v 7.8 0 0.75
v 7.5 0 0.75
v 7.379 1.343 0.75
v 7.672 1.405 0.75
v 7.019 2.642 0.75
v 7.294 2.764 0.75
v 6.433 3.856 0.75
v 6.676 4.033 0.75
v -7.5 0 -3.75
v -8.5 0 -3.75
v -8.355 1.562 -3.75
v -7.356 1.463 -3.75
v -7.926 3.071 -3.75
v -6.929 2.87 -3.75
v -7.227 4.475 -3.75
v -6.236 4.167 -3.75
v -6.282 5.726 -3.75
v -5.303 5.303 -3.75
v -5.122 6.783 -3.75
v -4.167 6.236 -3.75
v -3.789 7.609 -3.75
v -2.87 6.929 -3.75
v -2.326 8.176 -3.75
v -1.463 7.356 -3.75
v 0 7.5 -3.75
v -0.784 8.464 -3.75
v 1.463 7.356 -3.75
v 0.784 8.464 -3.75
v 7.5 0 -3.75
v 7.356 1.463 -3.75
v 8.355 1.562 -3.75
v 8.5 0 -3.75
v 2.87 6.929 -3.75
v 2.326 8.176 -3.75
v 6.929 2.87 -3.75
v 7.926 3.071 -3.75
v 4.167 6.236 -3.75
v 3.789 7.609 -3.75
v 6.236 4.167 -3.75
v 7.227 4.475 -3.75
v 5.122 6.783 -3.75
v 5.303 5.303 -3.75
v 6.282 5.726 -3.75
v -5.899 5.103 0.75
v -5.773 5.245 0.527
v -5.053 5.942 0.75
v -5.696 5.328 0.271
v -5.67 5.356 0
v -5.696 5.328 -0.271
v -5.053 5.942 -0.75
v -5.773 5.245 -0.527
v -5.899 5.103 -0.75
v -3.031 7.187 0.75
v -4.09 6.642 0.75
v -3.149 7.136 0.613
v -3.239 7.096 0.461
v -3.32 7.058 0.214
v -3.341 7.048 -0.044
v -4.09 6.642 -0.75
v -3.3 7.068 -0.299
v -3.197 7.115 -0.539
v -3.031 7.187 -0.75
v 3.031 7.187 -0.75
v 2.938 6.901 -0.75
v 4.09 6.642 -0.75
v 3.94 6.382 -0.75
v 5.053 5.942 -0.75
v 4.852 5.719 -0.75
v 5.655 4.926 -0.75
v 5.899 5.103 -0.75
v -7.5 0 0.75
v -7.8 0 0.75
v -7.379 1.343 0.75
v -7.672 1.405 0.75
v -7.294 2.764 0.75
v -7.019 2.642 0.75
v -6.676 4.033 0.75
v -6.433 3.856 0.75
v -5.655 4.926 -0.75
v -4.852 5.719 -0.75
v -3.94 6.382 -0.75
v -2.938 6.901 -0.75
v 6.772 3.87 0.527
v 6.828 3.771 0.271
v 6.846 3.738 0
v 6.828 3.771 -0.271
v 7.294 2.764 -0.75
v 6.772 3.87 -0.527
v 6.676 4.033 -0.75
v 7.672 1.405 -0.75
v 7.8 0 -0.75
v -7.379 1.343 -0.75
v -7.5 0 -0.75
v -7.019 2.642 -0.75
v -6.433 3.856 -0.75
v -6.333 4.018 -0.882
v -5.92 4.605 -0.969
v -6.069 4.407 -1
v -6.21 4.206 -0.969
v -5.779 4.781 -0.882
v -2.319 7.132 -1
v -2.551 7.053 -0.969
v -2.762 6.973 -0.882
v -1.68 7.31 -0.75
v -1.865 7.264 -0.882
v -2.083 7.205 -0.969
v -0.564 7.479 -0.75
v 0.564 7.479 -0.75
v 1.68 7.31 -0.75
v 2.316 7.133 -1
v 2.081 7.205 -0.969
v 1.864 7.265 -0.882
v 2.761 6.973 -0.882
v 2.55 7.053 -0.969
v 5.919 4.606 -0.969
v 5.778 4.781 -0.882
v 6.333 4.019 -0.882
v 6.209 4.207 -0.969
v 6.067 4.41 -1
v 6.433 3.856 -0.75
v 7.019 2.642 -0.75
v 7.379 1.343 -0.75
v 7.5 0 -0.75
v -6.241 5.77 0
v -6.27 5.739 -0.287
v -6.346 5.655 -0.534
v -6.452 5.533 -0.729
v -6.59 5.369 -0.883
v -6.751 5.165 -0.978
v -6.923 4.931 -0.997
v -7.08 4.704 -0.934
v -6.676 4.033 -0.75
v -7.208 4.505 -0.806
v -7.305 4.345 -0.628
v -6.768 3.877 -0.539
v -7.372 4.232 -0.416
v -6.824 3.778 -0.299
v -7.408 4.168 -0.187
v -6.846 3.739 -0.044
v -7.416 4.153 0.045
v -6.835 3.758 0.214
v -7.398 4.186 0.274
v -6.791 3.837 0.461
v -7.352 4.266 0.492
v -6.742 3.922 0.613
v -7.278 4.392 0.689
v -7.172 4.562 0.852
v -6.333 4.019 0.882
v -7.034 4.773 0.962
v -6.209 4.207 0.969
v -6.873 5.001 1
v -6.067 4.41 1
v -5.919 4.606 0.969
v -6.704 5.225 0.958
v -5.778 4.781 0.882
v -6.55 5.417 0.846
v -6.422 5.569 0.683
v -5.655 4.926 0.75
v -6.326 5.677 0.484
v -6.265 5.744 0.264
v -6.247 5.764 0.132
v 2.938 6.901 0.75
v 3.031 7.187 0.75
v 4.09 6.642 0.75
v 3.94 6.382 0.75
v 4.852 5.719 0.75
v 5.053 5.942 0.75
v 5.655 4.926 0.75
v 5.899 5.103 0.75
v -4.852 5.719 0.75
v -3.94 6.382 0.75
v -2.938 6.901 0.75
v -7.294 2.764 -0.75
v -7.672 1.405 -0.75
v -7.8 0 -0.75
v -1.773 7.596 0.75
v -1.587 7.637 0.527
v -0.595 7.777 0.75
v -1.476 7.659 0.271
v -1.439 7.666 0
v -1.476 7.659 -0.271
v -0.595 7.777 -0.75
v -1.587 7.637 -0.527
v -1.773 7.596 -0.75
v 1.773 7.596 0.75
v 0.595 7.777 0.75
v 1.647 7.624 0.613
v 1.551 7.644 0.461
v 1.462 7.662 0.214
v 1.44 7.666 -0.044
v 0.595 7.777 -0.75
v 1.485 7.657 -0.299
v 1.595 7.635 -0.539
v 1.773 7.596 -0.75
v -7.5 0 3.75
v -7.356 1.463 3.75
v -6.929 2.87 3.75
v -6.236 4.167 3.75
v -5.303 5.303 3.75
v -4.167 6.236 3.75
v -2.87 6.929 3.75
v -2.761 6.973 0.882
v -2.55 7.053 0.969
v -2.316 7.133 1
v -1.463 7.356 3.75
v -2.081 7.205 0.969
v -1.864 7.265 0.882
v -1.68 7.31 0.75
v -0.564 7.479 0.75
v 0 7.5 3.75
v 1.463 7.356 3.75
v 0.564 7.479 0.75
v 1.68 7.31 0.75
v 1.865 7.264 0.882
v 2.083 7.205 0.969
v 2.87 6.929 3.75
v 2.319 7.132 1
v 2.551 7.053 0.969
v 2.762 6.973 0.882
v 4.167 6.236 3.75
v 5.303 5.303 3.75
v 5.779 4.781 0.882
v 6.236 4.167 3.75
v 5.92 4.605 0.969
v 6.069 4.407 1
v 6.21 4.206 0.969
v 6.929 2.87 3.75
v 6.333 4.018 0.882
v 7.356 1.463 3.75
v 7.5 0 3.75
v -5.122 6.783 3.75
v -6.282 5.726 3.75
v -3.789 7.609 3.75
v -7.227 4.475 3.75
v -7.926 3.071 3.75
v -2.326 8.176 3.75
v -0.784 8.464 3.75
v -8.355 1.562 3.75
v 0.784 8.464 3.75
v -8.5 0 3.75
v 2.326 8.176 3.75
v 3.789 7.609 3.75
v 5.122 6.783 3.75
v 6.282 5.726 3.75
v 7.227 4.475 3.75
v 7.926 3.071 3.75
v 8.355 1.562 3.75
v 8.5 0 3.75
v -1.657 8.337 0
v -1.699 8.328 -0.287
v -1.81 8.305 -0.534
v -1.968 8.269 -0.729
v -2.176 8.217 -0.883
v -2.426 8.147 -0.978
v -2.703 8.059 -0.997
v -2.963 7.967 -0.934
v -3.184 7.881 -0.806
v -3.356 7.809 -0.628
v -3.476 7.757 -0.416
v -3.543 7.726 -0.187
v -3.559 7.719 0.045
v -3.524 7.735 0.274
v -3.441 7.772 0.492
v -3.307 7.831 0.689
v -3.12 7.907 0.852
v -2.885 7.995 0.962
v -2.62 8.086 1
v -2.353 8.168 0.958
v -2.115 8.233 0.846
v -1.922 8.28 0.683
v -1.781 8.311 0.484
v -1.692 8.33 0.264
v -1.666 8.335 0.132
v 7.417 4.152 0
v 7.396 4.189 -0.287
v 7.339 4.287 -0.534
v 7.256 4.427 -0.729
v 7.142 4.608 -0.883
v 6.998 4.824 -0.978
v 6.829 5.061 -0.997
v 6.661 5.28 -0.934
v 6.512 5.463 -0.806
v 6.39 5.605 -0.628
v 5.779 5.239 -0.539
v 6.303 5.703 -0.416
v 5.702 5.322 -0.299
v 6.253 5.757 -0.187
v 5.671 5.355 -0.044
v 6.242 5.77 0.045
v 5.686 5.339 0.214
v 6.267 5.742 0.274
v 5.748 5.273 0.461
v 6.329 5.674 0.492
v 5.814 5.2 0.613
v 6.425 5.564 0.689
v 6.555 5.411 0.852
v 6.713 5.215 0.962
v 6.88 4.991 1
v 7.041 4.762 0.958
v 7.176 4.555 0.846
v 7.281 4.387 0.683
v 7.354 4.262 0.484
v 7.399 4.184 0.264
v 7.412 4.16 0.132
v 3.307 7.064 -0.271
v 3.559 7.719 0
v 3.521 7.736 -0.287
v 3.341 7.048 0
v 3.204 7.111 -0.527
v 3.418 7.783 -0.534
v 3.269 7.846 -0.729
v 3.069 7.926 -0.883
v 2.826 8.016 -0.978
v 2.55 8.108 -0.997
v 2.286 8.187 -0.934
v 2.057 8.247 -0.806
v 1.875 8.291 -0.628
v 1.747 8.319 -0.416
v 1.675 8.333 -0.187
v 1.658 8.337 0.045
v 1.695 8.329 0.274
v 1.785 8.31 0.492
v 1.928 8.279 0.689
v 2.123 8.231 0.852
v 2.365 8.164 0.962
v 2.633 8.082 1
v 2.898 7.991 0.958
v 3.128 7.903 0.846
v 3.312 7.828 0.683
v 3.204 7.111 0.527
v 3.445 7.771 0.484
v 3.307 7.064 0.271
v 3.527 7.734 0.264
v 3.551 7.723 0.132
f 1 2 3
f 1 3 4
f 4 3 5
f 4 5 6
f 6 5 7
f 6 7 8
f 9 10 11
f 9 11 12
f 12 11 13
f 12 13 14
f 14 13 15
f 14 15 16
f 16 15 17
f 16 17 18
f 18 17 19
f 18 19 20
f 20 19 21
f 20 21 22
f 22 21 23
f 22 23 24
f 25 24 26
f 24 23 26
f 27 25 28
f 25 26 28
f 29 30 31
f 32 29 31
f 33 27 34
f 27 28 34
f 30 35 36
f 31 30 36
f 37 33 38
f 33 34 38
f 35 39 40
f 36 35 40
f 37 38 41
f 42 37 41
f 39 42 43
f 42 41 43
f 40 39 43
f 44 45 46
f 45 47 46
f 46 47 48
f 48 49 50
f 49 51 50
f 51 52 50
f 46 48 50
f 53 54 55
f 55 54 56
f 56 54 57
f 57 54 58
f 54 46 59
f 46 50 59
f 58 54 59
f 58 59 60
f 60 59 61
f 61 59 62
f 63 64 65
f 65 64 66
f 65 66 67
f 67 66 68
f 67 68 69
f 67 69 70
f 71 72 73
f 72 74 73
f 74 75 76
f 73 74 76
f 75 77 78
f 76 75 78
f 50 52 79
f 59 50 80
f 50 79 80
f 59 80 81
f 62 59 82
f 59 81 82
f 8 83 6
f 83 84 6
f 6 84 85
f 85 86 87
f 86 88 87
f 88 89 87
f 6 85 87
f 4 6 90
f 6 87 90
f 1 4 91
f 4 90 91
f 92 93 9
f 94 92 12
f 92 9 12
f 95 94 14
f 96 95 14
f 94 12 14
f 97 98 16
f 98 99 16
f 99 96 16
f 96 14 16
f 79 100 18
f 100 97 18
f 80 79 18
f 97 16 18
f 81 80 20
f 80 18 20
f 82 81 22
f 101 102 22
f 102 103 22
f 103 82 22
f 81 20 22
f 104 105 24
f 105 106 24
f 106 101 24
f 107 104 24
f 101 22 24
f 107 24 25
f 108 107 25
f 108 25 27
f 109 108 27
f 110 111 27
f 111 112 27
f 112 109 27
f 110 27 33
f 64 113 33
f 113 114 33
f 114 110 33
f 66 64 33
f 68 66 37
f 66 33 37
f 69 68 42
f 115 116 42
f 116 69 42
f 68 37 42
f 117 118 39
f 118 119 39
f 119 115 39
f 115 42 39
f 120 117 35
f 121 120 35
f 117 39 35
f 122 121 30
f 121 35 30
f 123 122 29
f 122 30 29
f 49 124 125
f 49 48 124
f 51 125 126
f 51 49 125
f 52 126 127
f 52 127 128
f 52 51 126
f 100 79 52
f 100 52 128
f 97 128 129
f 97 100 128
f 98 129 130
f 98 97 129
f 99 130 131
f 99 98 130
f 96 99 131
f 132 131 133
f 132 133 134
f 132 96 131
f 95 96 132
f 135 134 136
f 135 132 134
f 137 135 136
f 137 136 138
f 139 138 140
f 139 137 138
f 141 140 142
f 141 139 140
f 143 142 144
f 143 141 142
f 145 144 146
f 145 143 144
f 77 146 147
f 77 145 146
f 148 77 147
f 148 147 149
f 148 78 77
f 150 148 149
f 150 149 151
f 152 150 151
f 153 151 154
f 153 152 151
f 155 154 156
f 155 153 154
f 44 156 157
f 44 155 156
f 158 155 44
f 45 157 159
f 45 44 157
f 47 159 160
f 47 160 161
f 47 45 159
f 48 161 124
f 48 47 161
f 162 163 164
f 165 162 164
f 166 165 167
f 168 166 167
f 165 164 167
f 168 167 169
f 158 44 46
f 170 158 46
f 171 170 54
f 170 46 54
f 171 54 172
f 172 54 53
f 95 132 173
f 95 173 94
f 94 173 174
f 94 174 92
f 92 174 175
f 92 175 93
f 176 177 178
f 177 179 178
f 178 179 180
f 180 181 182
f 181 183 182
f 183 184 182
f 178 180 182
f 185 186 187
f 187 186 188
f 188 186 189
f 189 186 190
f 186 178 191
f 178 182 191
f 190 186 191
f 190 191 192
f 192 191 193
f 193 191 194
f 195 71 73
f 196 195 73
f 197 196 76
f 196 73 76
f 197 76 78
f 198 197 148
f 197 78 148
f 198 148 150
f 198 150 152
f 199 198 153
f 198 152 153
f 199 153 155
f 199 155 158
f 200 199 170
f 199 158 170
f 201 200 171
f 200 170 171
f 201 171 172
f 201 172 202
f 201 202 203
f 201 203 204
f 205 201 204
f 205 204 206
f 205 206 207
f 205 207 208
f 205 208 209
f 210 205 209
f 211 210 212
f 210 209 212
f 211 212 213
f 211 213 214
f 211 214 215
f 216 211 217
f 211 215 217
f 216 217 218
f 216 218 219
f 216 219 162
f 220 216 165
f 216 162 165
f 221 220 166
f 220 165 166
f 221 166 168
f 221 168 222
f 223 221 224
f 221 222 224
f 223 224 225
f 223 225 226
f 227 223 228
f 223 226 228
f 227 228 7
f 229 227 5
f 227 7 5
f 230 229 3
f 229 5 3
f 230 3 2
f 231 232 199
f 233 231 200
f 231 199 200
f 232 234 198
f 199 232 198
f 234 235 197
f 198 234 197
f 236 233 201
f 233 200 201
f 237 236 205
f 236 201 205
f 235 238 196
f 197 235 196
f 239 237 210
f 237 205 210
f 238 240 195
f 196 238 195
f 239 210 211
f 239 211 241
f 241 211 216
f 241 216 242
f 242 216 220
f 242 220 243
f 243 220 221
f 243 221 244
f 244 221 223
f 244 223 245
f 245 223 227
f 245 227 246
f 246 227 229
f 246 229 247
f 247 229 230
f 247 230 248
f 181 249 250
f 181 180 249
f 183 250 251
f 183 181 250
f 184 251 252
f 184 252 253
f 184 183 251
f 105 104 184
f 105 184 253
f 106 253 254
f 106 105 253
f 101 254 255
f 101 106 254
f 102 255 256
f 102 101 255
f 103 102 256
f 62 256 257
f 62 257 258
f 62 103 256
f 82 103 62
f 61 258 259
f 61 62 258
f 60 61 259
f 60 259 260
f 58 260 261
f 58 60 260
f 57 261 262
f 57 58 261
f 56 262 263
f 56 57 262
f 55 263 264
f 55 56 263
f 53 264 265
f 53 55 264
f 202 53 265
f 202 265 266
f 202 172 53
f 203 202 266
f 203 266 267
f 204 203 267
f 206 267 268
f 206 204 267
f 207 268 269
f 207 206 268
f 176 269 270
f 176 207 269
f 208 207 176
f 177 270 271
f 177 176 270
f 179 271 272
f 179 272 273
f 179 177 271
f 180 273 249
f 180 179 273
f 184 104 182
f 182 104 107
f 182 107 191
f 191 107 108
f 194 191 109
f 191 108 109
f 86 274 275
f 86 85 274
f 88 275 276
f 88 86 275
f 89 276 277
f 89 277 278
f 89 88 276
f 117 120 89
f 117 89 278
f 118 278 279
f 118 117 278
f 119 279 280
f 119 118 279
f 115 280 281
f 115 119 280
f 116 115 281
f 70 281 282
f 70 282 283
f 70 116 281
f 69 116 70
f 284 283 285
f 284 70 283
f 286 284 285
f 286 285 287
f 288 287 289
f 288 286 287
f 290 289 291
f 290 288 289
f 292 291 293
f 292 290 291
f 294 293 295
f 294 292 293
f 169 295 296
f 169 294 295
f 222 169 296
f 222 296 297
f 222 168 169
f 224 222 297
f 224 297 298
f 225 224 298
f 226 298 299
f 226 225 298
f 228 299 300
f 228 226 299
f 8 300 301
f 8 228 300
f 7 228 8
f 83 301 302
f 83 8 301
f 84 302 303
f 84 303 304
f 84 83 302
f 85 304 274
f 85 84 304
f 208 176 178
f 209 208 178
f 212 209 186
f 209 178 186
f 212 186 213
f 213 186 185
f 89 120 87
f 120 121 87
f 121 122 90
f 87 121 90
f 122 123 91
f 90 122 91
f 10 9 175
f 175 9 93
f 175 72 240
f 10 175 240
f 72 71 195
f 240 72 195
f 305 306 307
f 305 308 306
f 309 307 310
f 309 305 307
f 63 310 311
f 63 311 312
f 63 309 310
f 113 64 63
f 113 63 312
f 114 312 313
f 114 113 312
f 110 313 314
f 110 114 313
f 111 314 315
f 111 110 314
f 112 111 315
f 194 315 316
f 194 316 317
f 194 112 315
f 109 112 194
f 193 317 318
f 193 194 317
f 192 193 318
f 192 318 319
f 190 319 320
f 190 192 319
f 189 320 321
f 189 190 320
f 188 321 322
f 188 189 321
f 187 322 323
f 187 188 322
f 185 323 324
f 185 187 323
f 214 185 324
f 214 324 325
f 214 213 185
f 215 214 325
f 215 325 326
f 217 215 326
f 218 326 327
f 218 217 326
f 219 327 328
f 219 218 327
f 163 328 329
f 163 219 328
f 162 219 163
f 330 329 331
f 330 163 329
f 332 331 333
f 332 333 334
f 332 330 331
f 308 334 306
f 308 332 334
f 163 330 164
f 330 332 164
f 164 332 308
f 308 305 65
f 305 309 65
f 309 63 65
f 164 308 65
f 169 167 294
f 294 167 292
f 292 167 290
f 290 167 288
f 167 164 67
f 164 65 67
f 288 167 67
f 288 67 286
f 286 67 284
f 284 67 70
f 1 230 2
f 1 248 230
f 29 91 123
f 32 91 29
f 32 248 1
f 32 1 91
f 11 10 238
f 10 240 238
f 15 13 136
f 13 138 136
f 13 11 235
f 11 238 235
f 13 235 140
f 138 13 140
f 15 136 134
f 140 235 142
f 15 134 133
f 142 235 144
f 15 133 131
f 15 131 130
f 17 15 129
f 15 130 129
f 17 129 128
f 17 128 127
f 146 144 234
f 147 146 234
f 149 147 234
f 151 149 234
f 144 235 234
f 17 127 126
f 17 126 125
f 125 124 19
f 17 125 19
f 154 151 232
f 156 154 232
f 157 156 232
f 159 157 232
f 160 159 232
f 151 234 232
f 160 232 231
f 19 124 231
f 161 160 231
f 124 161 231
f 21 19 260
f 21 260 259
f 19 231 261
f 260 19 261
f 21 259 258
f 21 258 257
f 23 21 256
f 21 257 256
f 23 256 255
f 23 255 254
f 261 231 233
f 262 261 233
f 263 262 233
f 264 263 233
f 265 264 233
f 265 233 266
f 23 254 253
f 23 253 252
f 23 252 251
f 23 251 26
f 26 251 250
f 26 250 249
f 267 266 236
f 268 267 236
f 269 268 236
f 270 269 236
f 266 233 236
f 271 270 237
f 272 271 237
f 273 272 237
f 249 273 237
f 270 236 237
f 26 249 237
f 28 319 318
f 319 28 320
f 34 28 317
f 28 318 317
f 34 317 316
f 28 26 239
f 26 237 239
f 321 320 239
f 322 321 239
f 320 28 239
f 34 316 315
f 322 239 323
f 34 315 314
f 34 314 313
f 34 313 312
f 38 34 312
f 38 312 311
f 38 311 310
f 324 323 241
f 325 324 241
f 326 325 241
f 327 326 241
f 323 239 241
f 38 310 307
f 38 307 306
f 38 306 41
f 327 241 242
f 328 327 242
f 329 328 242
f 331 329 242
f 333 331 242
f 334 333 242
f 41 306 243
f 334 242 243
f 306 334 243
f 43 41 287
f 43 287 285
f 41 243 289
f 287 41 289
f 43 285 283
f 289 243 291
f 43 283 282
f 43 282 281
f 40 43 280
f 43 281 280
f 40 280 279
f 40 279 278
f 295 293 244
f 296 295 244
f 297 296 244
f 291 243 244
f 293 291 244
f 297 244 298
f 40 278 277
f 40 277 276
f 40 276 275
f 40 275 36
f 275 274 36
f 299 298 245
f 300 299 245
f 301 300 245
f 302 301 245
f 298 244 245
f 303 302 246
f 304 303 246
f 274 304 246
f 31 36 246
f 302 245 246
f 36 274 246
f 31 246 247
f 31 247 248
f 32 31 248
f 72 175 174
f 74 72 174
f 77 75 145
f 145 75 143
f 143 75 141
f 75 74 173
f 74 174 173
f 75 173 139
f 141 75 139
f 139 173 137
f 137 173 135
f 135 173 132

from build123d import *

# Parameters (mm, degrees)
CIRPATTERN1_COUNT = 4
CIRPATTERN1_ANGLE = 108


with BuildPart() as part:
    # Sweep1: sweep along a path in Sketch1
    with BuildLine(Plane.XY) as sweep1_path:
        ThreePointArc((-8.5, 0), (0, 8.5), (8.5, 0))
    # Sketch2 → Sweep1 (sweep)
    with BuildSketch(Plane(origin=(0, 0, 0), x_dir=(1, 0, 0), z_dir=(0, 1, 0))):
        Polygon((-7.5, -3.75), (-7.5, -0.75), (-7.8, -0.75), (-7.8, 0.75), (-7.5, 0.75), (-7.5, 3.75), (-8.5, 3.75), (-8.5, -3.75), align=None)
    sweep(path=sweep1_path.line)

    # Sketch3 → Cut-Revolve1 (revolve, cut)
    with BuildSketch(Plane.XY):
        Polygon((4.938511893, 3.588038915), (15.375889989, 11.171237983), (15.963675241, 10.362220989), (5.526297145, 2.779021921), align=None)
    cut_revolve1 = revolve(axis=Axis((4.938511893, 3.588038915, 0), (0.8090169943749489, 0.5877852522924712, 0)), mode=Mode.SUBTRACT)

    # CirPattern1: Cut-Revolve1 ×4 about axis
    cirpattern1_axis = Axis((0, 0, -11.55), (0, 0, 1))
    for i in range(1, CIRPATTERN1_COUNT):
        add(cut_revolve1.rotate(cirpattern1_axis, i * CIRPATTERN1_ANGLE / (CIRPATTERN1_COUNT - 1)), mode=Mode.SUBTRACT)


solid = part.part
